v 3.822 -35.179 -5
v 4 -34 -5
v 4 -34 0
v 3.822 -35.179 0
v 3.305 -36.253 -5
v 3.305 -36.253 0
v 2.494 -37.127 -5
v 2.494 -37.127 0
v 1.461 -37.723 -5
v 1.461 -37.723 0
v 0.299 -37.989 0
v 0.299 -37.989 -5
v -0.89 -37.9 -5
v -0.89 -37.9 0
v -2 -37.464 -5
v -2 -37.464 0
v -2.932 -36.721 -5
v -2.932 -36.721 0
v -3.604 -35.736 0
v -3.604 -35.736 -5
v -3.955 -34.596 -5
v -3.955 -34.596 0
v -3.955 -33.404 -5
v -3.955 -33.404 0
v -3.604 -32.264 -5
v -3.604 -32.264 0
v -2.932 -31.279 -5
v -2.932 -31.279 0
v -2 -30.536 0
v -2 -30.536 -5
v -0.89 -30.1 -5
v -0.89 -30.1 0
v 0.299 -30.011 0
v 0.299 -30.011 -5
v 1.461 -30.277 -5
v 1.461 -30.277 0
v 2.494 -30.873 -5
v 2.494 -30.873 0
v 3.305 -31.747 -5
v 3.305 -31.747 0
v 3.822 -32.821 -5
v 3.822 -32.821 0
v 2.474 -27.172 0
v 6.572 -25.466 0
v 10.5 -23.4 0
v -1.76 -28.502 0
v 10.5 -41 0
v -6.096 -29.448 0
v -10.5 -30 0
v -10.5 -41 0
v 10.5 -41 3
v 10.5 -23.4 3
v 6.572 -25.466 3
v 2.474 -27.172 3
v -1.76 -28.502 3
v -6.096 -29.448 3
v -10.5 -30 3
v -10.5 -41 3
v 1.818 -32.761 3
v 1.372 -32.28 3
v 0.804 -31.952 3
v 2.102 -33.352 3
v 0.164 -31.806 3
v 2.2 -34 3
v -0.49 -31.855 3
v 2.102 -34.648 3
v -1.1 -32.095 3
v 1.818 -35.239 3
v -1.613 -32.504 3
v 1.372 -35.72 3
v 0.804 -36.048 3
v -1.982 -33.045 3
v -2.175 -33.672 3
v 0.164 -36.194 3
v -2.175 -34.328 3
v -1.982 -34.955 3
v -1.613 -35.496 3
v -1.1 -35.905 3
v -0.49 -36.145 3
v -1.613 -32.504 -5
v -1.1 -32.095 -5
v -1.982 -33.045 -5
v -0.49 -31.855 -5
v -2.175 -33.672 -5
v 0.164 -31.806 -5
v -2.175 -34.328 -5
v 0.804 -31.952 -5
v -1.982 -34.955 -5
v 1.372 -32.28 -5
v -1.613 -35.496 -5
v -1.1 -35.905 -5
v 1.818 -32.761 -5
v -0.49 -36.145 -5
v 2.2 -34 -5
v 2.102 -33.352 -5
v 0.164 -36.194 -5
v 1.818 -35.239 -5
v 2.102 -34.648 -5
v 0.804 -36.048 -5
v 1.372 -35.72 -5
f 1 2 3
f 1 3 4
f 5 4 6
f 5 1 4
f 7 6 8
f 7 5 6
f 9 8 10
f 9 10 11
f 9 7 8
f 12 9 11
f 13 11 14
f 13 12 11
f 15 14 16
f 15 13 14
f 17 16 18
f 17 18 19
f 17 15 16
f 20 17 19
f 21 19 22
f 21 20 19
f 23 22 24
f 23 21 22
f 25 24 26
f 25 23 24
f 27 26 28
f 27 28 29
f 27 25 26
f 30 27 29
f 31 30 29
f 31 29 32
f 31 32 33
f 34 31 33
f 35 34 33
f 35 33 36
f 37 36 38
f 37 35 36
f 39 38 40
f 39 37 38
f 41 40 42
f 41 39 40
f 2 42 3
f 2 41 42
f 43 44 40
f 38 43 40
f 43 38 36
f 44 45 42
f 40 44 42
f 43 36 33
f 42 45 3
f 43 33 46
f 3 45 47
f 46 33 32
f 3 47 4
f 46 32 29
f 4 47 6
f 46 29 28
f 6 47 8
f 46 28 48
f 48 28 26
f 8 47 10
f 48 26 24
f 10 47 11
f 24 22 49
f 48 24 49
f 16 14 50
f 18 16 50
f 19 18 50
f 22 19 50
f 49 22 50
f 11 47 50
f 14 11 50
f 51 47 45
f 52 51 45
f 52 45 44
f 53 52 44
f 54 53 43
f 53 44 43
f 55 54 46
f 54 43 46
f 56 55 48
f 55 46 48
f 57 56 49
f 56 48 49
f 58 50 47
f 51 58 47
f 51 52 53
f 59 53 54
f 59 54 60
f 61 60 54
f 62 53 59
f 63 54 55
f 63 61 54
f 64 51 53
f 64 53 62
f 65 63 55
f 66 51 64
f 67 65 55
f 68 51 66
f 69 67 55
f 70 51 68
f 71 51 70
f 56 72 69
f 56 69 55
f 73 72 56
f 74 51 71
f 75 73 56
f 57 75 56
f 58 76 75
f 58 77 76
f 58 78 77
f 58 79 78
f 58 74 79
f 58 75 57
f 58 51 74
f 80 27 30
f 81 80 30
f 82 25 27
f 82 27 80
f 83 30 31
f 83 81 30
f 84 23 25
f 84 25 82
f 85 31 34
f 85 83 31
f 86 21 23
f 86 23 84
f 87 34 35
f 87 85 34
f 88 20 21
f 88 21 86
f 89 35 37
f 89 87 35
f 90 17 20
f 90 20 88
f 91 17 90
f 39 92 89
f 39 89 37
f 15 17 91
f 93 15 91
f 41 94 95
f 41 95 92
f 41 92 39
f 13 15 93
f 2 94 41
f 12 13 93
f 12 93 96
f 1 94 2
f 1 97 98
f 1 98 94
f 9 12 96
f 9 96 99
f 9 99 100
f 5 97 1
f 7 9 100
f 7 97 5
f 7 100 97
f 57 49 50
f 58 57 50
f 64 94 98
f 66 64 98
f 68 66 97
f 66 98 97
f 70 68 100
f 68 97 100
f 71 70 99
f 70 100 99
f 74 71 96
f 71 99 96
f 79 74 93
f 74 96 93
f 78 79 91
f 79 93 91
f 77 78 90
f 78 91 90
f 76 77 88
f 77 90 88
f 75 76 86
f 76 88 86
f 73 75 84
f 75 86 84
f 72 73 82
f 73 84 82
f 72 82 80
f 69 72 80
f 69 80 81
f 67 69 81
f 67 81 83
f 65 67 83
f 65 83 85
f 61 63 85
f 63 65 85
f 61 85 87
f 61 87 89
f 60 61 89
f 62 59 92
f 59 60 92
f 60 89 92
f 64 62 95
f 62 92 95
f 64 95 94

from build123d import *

# Parameters (mm, degrees)
CYLINDER002_R     = 2.2
CYLINDER002_DEPTH = 20
PAD002_DEPTH      = 3
CYLINDER003_R     = 4
CYLINDER003_DEPTH = 5


with BuildPart() as hole001:
    # Cylinder002 → Cylinder002 (new body)
    with BuildSketch(Plane.XY.offset(-10)):
        Circle(CYLINDER002_R)
    extrude(amount=CYLINDER002_DEPTH)


with BuildPart() as body002:
    # Sketch003 → Pad002 (new body)
    with BuildSketch(Plane.XY):
        with BuildLine():
            Line((-10.5, -4), (-10.5, 7))
            Line((-10.5, 7), (10.5, 7))
            Line((10.5, 7), (10.5, -10.6))
            ThreePointArc((10.5, -10.6), (0.372304, -6.115398), (-10.5, -4))
        make_face()
    extrude(amount=PAD002_DEPTH)


with BuildPart() as pad_cut:
    # Cylinder003 → Cylinder003 (new body)
    with BuildSketch(Plane.XY.offset(-5)):
        Circle(CYLINDER003_R)
    extrude(amount=CYLINDER003_DEPTH)

    # Fusion001: union Body002
    add(body002.part)

    # Cut001: cut hole001
    add(hole001.part, mode=Mode.SUBTRACT)


with BuildPart() as pad_cut_mirror:
    # Part__Mirroring: instance of pad cut
    add(pad_cut.part.mirror(Plane(origin=(0, -17, 0), x_dir=(1, 0, 0), z_dir=(0, 1, 0))))


solid = pad_cut_mirror.part
